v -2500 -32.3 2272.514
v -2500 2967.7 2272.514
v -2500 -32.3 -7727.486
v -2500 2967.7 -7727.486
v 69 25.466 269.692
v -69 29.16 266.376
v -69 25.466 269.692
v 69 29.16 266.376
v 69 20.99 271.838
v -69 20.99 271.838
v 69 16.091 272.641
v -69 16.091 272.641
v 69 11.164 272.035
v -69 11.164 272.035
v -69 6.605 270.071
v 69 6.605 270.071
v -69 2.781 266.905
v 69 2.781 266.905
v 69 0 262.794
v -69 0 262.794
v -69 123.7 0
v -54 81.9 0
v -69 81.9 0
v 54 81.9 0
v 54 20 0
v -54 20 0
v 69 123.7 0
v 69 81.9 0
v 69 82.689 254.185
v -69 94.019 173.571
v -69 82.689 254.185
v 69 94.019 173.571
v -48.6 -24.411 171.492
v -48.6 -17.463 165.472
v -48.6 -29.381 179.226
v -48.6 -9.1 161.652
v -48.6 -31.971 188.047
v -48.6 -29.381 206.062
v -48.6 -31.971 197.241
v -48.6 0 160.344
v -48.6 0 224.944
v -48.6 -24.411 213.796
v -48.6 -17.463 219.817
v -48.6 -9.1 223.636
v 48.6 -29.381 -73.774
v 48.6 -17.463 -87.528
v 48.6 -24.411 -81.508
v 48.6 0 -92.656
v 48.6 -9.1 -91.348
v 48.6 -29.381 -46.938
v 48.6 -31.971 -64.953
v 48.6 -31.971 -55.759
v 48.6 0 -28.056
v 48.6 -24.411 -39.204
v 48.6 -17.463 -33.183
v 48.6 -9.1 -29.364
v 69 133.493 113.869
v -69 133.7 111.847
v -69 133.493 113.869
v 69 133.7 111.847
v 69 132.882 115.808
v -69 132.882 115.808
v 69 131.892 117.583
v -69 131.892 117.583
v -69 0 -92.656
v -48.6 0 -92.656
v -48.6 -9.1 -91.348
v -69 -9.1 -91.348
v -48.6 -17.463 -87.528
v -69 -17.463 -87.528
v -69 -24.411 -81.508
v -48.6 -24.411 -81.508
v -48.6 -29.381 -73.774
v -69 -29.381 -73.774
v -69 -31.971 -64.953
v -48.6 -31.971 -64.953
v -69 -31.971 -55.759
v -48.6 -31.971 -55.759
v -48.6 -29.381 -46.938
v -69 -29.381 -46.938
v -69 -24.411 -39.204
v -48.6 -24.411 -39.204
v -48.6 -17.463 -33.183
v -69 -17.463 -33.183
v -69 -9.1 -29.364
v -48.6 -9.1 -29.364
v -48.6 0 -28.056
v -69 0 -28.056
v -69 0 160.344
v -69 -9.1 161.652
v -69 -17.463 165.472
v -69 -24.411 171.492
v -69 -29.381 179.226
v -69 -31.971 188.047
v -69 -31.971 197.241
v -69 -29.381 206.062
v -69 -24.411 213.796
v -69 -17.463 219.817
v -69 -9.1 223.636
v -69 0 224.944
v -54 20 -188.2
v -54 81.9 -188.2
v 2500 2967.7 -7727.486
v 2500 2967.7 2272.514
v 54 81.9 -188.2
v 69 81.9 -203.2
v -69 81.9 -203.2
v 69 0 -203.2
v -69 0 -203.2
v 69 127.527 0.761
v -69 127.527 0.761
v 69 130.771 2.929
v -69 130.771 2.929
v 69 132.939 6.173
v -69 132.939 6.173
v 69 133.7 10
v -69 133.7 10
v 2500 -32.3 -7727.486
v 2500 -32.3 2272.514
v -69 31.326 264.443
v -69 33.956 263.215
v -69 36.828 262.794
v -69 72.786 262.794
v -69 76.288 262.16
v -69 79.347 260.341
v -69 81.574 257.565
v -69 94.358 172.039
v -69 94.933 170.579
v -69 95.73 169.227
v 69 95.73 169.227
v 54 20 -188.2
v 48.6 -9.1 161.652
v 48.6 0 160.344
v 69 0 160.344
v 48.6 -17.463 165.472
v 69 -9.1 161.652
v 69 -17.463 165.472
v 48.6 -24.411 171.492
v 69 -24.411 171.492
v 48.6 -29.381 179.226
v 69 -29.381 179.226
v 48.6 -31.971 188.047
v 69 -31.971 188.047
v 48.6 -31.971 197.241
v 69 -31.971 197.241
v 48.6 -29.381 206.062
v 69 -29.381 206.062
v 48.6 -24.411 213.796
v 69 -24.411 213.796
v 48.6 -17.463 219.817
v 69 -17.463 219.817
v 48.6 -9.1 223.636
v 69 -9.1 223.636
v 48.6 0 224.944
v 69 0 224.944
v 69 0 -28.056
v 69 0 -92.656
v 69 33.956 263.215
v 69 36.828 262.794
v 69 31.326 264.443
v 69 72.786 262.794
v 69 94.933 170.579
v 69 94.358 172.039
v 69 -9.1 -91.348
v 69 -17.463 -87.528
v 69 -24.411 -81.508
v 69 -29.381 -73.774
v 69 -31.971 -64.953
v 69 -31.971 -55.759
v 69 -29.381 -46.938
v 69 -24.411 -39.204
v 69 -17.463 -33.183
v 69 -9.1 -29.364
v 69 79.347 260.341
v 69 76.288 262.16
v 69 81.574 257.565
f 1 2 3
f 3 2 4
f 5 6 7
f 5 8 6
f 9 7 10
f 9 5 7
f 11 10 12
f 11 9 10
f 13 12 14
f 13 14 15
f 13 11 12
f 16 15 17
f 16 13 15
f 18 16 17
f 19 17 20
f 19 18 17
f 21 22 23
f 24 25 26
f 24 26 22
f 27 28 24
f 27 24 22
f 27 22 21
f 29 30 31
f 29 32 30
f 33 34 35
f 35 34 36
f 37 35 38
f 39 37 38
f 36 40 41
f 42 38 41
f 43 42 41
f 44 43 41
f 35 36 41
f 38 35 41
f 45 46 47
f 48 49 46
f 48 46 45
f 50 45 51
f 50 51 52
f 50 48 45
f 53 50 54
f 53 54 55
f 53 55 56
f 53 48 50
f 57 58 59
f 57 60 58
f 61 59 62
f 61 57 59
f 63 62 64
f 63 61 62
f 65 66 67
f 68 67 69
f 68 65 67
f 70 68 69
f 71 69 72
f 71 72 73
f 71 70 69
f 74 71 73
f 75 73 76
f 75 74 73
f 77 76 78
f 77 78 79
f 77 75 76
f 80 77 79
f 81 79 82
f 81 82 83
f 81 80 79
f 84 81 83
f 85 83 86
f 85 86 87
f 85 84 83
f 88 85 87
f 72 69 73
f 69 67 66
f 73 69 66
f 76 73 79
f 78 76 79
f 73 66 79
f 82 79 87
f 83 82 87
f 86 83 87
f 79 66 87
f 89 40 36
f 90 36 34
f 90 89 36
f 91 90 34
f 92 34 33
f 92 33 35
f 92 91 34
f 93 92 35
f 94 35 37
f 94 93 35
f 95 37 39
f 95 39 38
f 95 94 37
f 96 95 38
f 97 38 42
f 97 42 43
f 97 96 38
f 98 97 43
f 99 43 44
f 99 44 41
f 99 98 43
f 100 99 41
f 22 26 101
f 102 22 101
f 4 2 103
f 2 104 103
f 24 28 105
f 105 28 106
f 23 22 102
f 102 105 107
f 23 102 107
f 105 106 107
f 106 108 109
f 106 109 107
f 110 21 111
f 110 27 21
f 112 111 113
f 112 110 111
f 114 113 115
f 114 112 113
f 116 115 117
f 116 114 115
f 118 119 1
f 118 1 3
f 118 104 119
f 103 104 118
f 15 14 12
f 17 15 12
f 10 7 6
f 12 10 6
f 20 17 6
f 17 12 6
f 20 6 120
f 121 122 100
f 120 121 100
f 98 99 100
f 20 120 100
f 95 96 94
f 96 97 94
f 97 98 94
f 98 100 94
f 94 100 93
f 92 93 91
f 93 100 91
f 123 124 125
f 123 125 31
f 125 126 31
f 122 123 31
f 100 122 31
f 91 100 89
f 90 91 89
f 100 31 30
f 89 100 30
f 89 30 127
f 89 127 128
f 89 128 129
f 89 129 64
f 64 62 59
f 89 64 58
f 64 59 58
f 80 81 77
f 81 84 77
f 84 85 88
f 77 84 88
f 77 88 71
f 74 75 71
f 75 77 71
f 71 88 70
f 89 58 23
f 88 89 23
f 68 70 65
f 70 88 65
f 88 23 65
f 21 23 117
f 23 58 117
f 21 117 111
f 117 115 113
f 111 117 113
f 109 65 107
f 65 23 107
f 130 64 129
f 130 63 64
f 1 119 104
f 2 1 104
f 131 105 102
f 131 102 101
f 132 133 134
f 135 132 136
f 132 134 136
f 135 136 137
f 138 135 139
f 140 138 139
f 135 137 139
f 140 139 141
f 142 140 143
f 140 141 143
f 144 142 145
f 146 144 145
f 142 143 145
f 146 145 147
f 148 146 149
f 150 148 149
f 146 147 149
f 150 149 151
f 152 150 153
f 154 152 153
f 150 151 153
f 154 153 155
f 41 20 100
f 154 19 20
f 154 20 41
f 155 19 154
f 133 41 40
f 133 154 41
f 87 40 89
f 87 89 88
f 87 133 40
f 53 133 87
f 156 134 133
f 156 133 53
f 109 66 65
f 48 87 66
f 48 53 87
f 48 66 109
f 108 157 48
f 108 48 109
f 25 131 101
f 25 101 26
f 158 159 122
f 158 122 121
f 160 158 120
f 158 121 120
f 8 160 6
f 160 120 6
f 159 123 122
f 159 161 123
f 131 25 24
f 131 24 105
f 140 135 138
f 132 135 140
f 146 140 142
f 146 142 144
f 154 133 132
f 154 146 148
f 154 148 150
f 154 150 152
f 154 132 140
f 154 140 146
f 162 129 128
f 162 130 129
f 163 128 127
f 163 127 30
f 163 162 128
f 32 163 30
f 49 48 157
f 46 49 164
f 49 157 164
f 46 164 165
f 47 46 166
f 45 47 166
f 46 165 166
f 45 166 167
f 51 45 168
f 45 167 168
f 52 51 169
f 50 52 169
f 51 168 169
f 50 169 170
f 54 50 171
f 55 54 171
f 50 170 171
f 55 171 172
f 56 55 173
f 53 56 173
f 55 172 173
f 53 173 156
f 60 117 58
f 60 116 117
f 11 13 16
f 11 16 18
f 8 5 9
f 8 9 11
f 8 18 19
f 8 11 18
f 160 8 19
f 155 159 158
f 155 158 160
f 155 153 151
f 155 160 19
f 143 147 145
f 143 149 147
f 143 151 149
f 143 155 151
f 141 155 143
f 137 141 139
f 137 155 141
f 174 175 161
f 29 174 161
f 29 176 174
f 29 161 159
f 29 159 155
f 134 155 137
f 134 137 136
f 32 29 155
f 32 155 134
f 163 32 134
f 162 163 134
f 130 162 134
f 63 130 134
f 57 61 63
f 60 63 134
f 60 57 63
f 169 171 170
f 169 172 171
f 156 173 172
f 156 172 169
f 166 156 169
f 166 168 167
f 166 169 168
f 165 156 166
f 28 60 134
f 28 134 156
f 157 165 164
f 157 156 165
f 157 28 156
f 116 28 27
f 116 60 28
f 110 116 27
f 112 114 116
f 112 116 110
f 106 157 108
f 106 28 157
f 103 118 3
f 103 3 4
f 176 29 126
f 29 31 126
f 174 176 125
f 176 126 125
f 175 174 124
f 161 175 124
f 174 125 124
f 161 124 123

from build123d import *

# Parameters (mm, degrees)
BOSS_EXTRUDE1_DEPTH = 69
SKETCH4_W           = 15
SKETCH4_H           = 188.2
BOSS_EXTRUDE2_DEPTH = 61.9
BOSS_EXTRUDE3_DEPTH = 20.4
FILLET1_R           = 10
SKETCH6_W           = 10000
SKETCH6_H           = 3000
BOSS_EXTRUDE4_DEPTH = 2500


with BuildPart() as part:
    # Sketch2 → Boss-Extrude1 (new body, symmetric)
    with BuildSketch(Plane(origin=(0, 0, 0), x_dir=(0, 0, -1), z_dir=(1, 0, 0))):
        with BuildLine():
            Line((-262.793626597, 0), (0, 0))
            Line((0, 0), (203.2, 0))
            Line((203.2, 0), (203.2, 81.9))
            Line((203.2, 81.9), (188.2, 81.9))
            Line((188.2, 81.9), (188.2, 20))
            Line((188.2, 20), (0, 20))
            Line((0, 20), (0, 133.7))
            Line((0, 133.7), (-115, 133.7))
            Line((-115, 133.7), (-171.193830238, 94.352656466))
            Line((-171.193830238, 94.352656466), (-262.793626597, 81.479144628))
            Line((-262.793626597, 81.479144628), (-262.793626597, 31.479144628))
            ThreePointArc((-262.793626597, 31.479144628), (-272.644060375, 15.739572314), (-262.793626597, 0))
        make_face()
    extrude(amount=BOSS_EXTRUDE1_DEPTH, both=True)

    # Sketch4 → Boss-Extrude2 (add)
    with BuildSketch(Plane(origin=(0, 20, 0), x_dir=(1, 0, 0), z_dir=(0, 1, 0))):
        with Locations((61.5, 94.1)):
            Rectangle(SKETCH4_W, SKETCH4_H)
    boss_extrude2 = extrude(amount=BOSS_EXTRUDE2_DEPTH)

    # Mirror1: Boss-Extrude2 across plane
    add(boss_extrude2.mirror(Plane(origin=(0, 0, 0), x_dir=(0, 0, 1), z_dir=(1, 0, 0))))

    # Sketch5 → Boss-Extrude3 (add)
    with BuildSketch(Plane(origin=(69, 0, 0), x_dir=(0, 0, -1), z_dir=(1, 0, 0))):
        with BuildLine():
            Line((-224.944060375, 0), (-160.344060375, 0))
            ThreePointArc((-160.344060375, 0), (-192.644060375, -32.3), (-224.944060375, 0))
        make_face()
        with BuildLine():
            Line((28.055939625, 0), (92.655939625, 0))
            ThreePointArc((92.655939625, 0), (60.355939625, -32.3), (28.055939625, 0))
        make_face()
    boss_extrude3 = extrude(amount=-BOSS_EXTRUDE3_DEPTH)

    # Mirror2: Boss-Extrude3 across plane
    add(boss_extrude3.mirror(Plane(origin=(0, 0, 0), x_dir=(0, 0, 1), z_dir=(1, 0, 0))))

    # Fillet1
    fillet1_edges = [part.edges().sort_by_distance(p)[0] for p in [
        (0, 31.479144628, 262.793626597),
        (0, 81.479144628, 262.793626597),
        (0, 94.352656466, 171.193830238),
        (0, 133.7, 115),
        (0, 133.7, 0),
    ]]
    fillet(fillet1_edges, radius=FILLET1_R)


with BuildPart() as body_2:
    # Sketch6 → Boss-Extrude4 (new body, symmetric)
    with BuildSketch(Plane(origin=(0, 0, 0), x_dir=(0, 0, -1), z_dir=(1, 0, 0))):
        with Locations((2727.48649749, 1467.7)):
            Rectangle(SKETCH6_W, SKETCH6_H)
    extrude(amount=BOSS_EXTRUDE4_DEPTH, both=True)


solid = Compound([part.part, body_2.part])
